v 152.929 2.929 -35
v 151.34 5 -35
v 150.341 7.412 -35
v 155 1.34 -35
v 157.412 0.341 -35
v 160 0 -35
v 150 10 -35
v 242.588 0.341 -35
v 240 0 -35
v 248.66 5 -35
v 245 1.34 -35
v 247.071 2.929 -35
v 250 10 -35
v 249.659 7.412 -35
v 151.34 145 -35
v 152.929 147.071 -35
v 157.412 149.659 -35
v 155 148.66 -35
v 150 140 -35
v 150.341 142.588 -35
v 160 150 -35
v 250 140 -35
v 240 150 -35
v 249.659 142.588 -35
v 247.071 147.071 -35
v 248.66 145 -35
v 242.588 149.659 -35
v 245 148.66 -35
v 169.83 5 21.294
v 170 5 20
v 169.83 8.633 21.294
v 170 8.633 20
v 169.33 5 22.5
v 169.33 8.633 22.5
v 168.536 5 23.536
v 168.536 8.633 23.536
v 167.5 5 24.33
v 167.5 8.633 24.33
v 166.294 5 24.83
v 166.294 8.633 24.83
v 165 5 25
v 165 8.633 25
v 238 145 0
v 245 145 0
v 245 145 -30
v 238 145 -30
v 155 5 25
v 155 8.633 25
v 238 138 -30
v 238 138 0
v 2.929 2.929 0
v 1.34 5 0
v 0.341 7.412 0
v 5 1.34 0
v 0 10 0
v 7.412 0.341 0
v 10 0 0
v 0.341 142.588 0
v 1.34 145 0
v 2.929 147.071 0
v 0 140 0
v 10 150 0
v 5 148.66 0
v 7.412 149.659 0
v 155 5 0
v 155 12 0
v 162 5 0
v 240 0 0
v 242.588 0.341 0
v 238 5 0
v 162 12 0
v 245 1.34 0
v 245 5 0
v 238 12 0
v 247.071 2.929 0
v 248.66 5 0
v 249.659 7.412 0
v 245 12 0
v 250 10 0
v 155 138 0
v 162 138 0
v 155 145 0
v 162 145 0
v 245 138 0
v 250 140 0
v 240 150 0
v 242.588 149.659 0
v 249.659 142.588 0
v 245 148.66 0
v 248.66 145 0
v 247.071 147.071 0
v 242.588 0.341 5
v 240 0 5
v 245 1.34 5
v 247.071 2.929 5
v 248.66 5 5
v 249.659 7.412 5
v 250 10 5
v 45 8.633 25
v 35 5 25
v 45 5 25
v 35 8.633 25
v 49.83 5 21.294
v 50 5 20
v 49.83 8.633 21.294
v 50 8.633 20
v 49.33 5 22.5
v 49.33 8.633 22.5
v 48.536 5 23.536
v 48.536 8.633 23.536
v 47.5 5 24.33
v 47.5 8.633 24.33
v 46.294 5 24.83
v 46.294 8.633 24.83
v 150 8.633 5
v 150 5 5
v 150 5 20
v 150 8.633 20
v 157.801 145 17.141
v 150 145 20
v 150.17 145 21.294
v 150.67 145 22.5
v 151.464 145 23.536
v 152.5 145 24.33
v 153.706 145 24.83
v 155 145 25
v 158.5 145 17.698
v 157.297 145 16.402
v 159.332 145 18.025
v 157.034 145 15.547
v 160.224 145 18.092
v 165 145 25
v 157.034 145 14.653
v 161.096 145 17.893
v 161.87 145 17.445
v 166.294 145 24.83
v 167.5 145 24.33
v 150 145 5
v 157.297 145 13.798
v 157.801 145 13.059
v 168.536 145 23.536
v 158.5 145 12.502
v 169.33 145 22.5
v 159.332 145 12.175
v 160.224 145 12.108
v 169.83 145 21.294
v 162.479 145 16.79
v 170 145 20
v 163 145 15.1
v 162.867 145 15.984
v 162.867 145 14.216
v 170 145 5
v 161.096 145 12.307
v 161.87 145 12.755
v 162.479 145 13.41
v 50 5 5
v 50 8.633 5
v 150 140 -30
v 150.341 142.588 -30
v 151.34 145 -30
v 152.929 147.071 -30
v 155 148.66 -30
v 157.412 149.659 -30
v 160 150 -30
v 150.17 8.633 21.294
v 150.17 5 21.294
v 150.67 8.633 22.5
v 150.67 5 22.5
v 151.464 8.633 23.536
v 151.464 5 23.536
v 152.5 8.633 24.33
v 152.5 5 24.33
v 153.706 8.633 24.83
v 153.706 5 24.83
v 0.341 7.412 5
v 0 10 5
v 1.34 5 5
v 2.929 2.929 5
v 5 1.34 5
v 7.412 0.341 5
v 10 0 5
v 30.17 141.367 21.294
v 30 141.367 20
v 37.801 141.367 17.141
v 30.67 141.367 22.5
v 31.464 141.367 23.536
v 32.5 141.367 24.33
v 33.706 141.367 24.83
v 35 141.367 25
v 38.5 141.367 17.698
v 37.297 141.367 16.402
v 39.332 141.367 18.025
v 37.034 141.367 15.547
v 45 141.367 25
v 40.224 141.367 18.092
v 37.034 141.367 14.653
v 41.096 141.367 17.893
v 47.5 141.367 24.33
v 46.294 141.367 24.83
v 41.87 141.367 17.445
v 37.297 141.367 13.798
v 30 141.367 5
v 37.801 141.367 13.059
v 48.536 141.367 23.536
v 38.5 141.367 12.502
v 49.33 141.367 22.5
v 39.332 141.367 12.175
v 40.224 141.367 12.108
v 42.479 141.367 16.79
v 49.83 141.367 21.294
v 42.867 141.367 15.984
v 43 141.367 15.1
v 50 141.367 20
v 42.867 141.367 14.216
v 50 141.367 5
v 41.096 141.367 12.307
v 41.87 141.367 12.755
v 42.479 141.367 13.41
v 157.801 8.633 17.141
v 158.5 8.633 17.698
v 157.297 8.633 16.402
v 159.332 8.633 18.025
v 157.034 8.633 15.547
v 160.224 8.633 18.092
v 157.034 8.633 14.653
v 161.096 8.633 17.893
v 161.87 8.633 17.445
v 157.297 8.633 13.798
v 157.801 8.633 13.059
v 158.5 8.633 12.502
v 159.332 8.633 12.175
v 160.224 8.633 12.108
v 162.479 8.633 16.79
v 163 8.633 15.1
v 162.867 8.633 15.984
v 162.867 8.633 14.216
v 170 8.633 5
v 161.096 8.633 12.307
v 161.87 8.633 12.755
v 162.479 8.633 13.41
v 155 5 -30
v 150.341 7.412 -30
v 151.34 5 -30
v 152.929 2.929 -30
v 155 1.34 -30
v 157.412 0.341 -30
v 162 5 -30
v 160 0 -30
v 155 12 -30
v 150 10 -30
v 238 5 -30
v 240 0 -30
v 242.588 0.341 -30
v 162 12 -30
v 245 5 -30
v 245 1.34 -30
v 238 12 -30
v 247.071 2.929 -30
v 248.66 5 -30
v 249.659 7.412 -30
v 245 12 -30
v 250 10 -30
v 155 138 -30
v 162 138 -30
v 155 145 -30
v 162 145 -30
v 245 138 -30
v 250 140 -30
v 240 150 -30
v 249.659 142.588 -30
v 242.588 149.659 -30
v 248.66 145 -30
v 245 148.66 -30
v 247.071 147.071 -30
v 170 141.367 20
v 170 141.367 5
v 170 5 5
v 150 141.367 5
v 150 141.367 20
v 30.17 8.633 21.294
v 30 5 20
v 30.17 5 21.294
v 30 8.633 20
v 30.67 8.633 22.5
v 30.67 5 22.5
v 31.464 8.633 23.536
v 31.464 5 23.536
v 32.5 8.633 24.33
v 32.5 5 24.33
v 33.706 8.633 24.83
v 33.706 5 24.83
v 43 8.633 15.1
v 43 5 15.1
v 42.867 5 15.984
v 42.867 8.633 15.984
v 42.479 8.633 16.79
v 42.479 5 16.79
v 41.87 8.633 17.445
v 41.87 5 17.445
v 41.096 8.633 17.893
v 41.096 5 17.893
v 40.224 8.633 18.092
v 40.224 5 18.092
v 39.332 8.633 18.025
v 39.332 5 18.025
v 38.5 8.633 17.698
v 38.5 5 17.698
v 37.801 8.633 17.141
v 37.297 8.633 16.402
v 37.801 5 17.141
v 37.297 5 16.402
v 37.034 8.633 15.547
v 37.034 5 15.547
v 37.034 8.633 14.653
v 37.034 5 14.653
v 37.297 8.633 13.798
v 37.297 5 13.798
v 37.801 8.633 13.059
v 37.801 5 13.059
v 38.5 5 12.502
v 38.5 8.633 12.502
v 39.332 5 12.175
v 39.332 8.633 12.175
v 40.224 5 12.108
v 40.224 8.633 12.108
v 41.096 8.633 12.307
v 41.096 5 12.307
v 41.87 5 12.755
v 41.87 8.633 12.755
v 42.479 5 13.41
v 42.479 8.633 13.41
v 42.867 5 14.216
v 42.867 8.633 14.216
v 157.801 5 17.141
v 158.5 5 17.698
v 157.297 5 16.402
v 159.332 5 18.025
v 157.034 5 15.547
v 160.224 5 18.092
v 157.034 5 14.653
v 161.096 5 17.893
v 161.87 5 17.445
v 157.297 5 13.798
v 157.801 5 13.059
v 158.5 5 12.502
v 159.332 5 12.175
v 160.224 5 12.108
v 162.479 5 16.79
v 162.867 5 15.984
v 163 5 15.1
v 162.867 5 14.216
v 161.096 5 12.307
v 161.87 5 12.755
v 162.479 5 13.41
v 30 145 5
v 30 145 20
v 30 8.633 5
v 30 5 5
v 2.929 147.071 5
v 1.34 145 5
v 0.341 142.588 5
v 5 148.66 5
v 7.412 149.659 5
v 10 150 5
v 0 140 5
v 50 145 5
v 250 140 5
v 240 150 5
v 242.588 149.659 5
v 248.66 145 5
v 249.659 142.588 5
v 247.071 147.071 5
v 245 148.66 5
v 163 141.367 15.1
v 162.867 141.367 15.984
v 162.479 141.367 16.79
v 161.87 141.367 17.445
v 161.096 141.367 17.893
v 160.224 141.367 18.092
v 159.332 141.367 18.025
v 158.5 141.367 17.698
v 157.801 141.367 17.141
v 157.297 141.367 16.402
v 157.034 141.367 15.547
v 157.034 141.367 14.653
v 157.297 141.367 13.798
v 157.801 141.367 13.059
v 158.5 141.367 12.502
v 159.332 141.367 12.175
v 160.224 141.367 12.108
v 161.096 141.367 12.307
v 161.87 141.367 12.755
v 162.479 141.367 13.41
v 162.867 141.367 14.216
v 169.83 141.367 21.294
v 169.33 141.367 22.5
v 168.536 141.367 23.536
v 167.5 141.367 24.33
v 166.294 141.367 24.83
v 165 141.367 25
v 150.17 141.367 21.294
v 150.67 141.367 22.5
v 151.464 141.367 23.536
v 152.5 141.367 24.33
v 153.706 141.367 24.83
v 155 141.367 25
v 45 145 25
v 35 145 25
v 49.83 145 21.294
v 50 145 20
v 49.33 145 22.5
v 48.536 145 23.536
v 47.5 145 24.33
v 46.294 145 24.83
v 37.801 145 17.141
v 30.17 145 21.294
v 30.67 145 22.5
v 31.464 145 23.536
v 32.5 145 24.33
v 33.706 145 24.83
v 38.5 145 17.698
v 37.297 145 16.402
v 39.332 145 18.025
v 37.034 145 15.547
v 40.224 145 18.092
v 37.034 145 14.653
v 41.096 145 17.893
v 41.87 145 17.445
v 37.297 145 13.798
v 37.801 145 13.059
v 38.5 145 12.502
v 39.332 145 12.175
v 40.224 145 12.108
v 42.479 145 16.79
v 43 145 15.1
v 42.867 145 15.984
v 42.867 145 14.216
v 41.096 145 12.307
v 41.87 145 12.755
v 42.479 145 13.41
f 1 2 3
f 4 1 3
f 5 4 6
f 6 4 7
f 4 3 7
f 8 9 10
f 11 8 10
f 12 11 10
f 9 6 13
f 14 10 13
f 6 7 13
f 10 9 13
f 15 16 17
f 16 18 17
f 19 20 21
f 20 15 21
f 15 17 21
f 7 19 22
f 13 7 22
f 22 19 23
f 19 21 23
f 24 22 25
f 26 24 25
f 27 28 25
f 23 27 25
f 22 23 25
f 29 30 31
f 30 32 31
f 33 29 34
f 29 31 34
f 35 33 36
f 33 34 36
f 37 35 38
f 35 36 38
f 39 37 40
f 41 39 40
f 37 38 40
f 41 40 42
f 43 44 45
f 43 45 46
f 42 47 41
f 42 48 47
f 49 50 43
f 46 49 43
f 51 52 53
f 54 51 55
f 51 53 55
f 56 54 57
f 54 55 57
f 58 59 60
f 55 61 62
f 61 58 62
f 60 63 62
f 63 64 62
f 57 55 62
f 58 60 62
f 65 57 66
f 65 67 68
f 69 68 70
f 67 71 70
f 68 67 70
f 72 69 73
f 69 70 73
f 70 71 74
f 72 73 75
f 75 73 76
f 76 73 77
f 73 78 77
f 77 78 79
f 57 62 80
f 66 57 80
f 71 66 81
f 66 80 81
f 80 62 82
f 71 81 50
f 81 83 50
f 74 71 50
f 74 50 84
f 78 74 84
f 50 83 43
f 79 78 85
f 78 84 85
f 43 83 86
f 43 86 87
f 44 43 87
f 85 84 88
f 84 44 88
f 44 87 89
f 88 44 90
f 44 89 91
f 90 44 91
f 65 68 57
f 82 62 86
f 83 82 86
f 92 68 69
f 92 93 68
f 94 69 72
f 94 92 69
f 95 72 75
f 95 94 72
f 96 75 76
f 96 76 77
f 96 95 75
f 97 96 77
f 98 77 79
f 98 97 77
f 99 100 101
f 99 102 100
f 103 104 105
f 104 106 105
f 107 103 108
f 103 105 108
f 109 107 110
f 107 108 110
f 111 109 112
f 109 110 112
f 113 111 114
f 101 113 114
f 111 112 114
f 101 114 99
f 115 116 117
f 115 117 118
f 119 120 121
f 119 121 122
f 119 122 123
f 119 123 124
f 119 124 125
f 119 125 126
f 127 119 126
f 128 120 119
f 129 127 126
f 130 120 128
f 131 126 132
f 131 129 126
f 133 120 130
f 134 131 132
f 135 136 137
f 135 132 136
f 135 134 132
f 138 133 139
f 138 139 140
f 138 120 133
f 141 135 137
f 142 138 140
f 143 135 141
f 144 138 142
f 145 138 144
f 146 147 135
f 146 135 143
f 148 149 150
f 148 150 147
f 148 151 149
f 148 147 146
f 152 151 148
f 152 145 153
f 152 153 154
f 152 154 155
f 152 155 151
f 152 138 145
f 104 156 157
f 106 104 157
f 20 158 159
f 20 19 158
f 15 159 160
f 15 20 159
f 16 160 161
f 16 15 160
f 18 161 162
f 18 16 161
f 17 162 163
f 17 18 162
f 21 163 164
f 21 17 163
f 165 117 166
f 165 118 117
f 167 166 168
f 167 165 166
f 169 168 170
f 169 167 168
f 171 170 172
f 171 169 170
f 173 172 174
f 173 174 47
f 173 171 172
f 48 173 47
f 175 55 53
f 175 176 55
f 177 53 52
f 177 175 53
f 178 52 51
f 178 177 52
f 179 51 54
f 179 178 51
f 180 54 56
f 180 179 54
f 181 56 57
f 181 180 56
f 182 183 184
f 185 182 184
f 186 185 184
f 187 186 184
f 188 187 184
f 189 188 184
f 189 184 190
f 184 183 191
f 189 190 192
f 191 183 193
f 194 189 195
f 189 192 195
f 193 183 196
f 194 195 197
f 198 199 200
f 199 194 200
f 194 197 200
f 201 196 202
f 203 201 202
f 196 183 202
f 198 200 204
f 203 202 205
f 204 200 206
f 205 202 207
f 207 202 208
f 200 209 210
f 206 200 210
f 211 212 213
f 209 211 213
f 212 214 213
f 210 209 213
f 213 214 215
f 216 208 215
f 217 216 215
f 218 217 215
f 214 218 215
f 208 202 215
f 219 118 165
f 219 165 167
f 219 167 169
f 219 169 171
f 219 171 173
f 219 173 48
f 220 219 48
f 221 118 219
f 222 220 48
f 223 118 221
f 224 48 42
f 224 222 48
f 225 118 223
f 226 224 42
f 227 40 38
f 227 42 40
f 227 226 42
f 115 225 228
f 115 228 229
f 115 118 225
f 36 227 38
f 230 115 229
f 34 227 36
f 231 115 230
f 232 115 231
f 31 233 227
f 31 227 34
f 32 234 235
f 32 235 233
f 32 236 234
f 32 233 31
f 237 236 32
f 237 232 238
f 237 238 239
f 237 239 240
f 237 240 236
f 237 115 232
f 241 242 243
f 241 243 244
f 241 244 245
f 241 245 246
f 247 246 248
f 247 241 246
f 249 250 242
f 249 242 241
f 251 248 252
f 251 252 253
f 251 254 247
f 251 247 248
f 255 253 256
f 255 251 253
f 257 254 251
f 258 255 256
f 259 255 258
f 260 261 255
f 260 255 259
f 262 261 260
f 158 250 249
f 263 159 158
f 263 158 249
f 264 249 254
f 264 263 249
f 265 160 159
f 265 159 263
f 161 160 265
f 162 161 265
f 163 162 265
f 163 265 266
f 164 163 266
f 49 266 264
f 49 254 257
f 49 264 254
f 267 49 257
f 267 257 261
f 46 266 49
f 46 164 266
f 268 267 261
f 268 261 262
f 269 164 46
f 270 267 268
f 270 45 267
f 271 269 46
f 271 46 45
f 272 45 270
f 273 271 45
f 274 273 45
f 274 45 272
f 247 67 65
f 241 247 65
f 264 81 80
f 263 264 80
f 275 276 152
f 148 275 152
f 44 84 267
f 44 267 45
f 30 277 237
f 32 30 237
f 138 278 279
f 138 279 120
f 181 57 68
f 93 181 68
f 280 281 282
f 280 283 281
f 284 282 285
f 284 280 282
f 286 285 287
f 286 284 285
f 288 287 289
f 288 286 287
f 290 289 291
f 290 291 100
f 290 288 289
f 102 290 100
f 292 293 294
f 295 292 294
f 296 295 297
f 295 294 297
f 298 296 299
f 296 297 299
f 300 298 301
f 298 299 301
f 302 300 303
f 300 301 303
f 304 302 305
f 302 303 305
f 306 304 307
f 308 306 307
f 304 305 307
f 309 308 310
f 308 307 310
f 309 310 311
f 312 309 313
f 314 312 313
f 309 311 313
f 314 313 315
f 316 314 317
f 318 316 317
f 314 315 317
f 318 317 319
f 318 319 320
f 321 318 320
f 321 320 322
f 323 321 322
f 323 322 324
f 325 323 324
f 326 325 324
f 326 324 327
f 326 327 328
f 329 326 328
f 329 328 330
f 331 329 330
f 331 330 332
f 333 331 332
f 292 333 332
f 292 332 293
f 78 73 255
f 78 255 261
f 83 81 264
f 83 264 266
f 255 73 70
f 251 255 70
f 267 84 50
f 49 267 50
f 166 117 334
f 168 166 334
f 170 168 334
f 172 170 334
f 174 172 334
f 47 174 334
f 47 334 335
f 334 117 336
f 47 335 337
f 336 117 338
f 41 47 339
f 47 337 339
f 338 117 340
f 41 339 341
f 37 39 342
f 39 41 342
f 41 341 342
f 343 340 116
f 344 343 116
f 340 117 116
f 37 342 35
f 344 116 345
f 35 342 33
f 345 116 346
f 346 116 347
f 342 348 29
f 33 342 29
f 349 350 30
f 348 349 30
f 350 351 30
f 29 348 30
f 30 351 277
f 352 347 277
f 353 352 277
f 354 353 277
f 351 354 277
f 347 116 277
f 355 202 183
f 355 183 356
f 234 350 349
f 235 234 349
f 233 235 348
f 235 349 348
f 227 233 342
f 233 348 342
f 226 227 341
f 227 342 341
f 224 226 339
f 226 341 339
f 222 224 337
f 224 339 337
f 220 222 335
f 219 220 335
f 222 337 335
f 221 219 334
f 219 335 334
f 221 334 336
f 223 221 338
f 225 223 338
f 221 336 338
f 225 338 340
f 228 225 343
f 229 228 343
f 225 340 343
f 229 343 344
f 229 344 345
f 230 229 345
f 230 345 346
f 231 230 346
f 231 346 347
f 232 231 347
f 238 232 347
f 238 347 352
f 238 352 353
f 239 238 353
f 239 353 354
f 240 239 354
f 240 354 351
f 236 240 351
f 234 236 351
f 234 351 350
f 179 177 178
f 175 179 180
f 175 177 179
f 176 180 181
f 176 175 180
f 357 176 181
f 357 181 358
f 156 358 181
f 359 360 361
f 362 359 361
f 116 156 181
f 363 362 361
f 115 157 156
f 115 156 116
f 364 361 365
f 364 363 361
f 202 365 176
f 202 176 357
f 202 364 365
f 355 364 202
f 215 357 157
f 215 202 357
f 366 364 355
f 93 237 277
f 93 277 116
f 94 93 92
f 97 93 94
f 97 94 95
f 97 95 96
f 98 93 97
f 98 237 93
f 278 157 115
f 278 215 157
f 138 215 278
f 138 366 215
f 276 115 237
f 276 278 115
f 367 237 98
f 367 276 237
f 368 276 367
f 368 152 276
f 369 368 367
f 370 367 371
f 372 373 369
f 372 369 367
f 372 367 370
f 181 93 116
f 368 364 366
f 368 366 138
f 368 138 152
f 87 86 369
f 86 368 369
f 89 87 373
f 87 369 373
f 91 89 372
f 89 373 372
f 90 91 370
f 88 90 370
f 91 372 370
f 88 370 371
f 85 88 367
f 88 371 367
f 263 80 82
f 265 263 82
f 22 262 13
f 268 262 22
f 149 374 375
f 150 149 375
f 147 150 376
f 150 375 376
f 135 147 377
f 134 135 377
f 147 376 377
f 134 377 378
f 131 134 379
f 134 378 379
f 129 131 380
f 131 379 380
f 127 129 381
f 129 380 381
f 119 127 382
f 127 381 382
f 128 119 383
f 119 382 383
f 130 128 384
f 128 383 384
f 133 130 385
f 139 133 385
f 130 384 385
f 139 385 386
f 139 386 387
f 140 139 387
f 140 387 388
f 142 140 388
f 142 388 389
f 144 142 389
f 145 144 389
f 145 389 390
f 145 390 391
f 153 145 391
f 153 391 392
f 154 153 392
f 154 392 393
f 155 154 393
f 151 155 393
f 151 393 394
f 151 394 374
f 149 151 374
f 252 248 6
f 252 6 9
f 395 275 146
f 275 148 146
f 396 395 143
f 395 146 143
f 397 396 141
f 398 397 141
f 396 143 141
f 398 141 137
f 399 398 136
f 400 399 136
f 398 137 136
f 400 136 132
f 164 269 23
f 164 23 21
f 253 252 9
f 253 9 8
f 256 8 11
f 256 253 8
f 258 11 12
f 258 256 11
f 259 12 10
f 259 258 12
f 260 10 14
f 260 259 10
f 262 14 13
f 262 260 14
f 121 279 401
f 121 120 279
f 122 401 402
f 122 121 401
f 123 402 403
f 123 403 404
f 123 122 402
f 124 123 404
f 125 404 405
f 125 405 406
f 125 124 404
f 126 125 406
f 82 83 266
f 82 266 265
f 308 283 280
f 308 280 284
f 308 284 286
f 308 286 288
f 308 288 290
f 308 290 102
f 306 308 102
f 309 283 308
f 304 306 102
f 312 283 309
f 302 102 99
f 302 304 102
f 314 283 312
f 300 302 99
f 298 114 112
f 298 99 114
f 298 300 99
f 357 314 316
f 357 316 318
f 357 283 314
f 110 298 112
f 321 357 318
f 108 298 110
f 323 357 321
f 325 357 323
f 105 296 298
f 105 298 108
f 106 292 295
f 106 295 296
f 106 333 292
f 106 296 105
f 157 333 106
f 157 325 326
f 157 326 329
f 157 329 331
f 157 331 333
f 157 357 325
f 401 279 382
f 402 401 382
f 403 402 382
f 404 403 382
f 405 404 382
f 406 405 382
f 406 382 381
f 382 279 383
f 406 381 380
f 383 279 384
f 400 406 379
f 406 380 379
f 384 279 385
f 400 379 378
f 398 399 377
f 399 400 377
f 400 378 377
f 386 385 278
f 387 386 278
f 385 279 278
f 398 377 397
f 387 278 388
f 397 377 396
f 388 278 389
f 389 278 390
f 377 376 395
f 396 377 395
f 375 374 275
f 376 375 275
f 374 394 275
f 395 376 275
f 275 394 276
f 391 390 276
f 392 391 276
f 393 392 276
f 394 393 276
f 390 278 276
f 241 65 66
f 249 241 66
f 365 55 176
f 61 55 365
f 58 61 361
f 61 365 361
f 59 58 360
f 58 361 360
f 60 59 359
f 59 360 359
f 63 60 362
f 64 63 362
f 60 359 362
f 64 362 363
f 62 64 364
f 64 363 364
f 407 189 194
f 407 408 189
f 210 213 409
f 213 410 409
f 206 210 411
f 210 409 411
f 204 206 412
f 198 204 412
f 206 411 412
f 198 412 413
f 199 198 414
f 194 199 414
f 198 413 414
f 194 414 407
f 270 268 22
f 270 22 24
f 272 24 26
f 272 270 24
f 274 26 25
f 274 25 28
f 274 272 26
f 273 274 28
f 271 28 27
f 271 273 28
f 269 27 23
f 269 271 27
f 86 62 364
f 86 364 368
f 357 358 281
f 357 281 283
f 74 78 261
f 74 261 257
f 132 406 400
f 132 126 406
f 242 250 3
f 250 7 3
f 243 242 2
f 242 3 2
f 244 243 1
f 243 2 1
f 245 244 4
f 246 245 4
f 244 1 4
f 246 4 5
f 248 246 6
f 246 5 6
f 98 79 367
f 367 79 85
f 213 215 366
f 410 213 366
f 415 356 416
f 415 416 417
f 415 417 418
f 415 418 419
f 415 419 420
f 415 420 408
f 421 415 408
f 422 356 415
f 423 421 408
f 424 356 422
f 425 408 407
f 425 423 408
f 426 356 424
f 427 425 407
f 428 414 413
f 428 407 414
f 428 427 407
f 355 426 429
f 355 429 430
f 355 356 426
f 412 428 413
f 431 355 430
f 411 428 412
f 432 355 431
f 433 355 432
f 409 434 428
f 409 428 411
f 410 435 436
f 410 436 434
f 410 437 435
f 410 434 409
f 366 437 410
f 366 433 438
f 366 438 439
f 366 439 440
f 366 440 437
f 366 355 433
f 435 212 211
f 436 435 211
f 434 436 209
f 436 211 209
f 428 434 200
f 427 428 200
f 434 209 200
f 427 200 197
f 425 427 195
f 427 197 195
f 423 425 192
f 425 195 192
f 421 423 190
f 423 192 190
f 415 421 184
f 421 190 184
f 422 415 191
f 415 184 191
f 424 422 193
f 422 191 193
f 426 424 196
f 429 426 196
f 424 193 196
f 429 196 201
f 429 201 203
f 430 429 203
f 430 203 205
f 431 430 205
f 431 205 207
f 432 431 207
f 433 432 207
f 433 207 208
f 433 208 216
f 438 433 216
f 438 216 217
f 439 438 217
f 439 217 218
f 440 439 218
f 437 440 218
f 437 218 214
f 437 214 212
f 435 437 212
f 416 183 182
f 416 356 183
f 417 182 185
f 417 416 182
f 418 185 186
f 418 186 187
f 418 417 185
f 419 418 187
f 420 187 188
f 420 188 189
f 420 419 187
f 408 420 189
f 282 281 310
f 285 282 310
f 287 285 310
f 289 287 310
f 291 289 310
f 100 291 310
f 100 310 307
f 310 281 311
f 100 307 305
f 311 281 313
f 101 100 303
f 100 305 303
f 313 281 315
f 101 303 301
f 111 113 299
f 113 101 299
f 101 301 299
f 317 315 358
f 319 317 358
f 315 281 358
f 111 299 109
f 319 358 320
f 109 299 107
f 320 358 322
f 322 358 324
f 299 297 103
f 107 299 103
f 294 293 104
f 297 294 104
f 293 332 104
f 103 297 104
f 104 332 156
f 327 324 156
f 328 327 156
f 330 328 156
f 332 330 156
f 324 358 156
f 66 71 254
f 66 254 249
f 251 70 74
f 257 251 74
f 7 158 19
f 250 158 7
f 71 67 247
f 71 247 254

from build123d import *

# Parameters (mm, degrees)
SKETCH1_W               = 250
SKETCH1_H               = 150
BOSS_EXTRUDE1_DEPTH     = 5
SKETCH1_3_W             = 20
SKETCH1_3_H             = 3.633461532
BOSS_EXTRUDE2_DEPTH     = 25
SKETCH2_R               = 3
CUT_EXTRUDE1_DEPTH      = 6
CUT_EXTRUDE1_DEPTH_BACK = 146
FILLET1_R               = 5
FILLET2_R               = 10
SKETCH3_W               = 7
SKETCH3_H               = 7
BOSS_EXTRUDE3_DEPTH     = 30
BOSS_EXTRUDE5_DEPTH     = 5
FILLET4_R               = 10


with BuildPart() as part:
    # Sketch1 → Boss-Extrude1 (new body)
    with BuildSketch(Plane.XY):
        with Locations((125, 75)):
            Rectangle(SKETCH1_W, SKETCH1_H)
    extrude(amount=BOSS_EXTRUDE1_DEPTH)

    # Sketch1<3> → Boss-Extrude2 (add)
    with BuildSketch(Plane.XY):
        with Locations((160, 6.816730766)):
            Rectangle(SKETCH1_3_W, SKETCH1_3_H)
        with Locations((40, 143.183269234)):
            Rectangle(SKETCH1_3_W, SKETCH1_3_H)
        with Locations((160, 143.183269234)):
            Rectangle(SKETCH1_3_W, SKETCH1_3_H)
        with Locations((40, 6.816730766)):
            Rectangle(SKETCH1_3_W, SKETCH1_3_H)
    extrude(amount=BOSS_EXTRUDE2_DEPTH)

    # Sketch2 → Cut-Extrude1 (cut, two sides)
    with BuildSketch(Plane.XZ.offset(-5)) as cut_extrude1_sk:
        with Locations((40, 15.1)):
            Circle(SKETCH2_R)
        with Locations((160, 15.1)):
            Circle(SKETCH2_R)
    extrude(amount=CUT_EXTRUDE1_DEPTH, mode=Mode.SUBTRACT)
    extrude(cut_extrude1_sk.sketch, amount=-CUT_EXTRUDE1_DEPTH_BACK, mode=Mode.SUBTRACT)

    # Fillet1
    fillet1_edges = [part.edges().sort_by_distance(p)[0] for p in [
        (50, 143.183269234, 25),
        (30, 143.183269234, 25),
        (30, 6.816730766, 25),
        (50, 6.816730766, 25),
        (150, 6.816730766, 25),
        (170, 6.816730766, 25),
        (170, 143.183269234, 25),
        (150, 143.183269234, 25),
    ]]
    fillet(fillet1_edges, radius=FILLET1_R)

    # Fillet2
    fillet2_edges = [part.edges().sort_by_distance(p)[0] for p in [
        (0, 0, 2.5),
        (0, 150, 2.5),
        (250, 150, 2.5),
        (250, 0, 2.5),
    ]]
    fillet(fillet2_edges, radius=FILLET2_R)

    # Sketch3 → Boss-Extrude3 (add)
    with BuildSketch(Plane(origin=(0, 0, 0), x_dir=(-1, 0, 0), z_dir=(0, 0, -1))):
        with Locations((-241.5, 141.5)):
            Rectangle(SKETCH3_W, SKETCH3_H)
        with Locations((-241.5, 8.5)):
            Rectangle(SKETCH3_W, SKETCH3_H)
        with Locations((-158.5, 8.5)):
            Rectangle(SKETCH3_W, SKETCH3_H)
        with Locations((-158.5, 141.5)):
            Rectangle(SKETCH3_W, SKETCH3_H)
    extrude(amount=BOSS_EXTRUDE3_DEPTH)

    # Sketch10 → Boss-Extrude5 (add)
    with BuildSketch(Plane(origin=(0, 0, -30), x_dir=(-1, 0, 0), z_dir=(0, 0, -1))):
        with BuildLine():
            Line((-150, 150), (-150, 0))
            Line((-150, 0), (-240, 0))
            ThreePointArc((-240, 0), (-247.071067812, 2.928932188), (-250, 10))
            Line((-250, 10), (-250, 140))
            ThreePointArc((-250, 140), (-247.071067812, 147.071067812), (-240, 150))
            Line((-240, 150), (-150, 150))
        make_face()
    extrude(amount=BOSS_EXTRUDE5_DEPTH)

    # Fillet4
    fillet4_edges = [part.edges().sort_by_distance(p)[0] for p in [
        (150, 150, -32.5),
        (150, 0, -32.5),
    ]]
    fillet(fillet4_edges, radius=FILLET4_R)


solid = part.part
